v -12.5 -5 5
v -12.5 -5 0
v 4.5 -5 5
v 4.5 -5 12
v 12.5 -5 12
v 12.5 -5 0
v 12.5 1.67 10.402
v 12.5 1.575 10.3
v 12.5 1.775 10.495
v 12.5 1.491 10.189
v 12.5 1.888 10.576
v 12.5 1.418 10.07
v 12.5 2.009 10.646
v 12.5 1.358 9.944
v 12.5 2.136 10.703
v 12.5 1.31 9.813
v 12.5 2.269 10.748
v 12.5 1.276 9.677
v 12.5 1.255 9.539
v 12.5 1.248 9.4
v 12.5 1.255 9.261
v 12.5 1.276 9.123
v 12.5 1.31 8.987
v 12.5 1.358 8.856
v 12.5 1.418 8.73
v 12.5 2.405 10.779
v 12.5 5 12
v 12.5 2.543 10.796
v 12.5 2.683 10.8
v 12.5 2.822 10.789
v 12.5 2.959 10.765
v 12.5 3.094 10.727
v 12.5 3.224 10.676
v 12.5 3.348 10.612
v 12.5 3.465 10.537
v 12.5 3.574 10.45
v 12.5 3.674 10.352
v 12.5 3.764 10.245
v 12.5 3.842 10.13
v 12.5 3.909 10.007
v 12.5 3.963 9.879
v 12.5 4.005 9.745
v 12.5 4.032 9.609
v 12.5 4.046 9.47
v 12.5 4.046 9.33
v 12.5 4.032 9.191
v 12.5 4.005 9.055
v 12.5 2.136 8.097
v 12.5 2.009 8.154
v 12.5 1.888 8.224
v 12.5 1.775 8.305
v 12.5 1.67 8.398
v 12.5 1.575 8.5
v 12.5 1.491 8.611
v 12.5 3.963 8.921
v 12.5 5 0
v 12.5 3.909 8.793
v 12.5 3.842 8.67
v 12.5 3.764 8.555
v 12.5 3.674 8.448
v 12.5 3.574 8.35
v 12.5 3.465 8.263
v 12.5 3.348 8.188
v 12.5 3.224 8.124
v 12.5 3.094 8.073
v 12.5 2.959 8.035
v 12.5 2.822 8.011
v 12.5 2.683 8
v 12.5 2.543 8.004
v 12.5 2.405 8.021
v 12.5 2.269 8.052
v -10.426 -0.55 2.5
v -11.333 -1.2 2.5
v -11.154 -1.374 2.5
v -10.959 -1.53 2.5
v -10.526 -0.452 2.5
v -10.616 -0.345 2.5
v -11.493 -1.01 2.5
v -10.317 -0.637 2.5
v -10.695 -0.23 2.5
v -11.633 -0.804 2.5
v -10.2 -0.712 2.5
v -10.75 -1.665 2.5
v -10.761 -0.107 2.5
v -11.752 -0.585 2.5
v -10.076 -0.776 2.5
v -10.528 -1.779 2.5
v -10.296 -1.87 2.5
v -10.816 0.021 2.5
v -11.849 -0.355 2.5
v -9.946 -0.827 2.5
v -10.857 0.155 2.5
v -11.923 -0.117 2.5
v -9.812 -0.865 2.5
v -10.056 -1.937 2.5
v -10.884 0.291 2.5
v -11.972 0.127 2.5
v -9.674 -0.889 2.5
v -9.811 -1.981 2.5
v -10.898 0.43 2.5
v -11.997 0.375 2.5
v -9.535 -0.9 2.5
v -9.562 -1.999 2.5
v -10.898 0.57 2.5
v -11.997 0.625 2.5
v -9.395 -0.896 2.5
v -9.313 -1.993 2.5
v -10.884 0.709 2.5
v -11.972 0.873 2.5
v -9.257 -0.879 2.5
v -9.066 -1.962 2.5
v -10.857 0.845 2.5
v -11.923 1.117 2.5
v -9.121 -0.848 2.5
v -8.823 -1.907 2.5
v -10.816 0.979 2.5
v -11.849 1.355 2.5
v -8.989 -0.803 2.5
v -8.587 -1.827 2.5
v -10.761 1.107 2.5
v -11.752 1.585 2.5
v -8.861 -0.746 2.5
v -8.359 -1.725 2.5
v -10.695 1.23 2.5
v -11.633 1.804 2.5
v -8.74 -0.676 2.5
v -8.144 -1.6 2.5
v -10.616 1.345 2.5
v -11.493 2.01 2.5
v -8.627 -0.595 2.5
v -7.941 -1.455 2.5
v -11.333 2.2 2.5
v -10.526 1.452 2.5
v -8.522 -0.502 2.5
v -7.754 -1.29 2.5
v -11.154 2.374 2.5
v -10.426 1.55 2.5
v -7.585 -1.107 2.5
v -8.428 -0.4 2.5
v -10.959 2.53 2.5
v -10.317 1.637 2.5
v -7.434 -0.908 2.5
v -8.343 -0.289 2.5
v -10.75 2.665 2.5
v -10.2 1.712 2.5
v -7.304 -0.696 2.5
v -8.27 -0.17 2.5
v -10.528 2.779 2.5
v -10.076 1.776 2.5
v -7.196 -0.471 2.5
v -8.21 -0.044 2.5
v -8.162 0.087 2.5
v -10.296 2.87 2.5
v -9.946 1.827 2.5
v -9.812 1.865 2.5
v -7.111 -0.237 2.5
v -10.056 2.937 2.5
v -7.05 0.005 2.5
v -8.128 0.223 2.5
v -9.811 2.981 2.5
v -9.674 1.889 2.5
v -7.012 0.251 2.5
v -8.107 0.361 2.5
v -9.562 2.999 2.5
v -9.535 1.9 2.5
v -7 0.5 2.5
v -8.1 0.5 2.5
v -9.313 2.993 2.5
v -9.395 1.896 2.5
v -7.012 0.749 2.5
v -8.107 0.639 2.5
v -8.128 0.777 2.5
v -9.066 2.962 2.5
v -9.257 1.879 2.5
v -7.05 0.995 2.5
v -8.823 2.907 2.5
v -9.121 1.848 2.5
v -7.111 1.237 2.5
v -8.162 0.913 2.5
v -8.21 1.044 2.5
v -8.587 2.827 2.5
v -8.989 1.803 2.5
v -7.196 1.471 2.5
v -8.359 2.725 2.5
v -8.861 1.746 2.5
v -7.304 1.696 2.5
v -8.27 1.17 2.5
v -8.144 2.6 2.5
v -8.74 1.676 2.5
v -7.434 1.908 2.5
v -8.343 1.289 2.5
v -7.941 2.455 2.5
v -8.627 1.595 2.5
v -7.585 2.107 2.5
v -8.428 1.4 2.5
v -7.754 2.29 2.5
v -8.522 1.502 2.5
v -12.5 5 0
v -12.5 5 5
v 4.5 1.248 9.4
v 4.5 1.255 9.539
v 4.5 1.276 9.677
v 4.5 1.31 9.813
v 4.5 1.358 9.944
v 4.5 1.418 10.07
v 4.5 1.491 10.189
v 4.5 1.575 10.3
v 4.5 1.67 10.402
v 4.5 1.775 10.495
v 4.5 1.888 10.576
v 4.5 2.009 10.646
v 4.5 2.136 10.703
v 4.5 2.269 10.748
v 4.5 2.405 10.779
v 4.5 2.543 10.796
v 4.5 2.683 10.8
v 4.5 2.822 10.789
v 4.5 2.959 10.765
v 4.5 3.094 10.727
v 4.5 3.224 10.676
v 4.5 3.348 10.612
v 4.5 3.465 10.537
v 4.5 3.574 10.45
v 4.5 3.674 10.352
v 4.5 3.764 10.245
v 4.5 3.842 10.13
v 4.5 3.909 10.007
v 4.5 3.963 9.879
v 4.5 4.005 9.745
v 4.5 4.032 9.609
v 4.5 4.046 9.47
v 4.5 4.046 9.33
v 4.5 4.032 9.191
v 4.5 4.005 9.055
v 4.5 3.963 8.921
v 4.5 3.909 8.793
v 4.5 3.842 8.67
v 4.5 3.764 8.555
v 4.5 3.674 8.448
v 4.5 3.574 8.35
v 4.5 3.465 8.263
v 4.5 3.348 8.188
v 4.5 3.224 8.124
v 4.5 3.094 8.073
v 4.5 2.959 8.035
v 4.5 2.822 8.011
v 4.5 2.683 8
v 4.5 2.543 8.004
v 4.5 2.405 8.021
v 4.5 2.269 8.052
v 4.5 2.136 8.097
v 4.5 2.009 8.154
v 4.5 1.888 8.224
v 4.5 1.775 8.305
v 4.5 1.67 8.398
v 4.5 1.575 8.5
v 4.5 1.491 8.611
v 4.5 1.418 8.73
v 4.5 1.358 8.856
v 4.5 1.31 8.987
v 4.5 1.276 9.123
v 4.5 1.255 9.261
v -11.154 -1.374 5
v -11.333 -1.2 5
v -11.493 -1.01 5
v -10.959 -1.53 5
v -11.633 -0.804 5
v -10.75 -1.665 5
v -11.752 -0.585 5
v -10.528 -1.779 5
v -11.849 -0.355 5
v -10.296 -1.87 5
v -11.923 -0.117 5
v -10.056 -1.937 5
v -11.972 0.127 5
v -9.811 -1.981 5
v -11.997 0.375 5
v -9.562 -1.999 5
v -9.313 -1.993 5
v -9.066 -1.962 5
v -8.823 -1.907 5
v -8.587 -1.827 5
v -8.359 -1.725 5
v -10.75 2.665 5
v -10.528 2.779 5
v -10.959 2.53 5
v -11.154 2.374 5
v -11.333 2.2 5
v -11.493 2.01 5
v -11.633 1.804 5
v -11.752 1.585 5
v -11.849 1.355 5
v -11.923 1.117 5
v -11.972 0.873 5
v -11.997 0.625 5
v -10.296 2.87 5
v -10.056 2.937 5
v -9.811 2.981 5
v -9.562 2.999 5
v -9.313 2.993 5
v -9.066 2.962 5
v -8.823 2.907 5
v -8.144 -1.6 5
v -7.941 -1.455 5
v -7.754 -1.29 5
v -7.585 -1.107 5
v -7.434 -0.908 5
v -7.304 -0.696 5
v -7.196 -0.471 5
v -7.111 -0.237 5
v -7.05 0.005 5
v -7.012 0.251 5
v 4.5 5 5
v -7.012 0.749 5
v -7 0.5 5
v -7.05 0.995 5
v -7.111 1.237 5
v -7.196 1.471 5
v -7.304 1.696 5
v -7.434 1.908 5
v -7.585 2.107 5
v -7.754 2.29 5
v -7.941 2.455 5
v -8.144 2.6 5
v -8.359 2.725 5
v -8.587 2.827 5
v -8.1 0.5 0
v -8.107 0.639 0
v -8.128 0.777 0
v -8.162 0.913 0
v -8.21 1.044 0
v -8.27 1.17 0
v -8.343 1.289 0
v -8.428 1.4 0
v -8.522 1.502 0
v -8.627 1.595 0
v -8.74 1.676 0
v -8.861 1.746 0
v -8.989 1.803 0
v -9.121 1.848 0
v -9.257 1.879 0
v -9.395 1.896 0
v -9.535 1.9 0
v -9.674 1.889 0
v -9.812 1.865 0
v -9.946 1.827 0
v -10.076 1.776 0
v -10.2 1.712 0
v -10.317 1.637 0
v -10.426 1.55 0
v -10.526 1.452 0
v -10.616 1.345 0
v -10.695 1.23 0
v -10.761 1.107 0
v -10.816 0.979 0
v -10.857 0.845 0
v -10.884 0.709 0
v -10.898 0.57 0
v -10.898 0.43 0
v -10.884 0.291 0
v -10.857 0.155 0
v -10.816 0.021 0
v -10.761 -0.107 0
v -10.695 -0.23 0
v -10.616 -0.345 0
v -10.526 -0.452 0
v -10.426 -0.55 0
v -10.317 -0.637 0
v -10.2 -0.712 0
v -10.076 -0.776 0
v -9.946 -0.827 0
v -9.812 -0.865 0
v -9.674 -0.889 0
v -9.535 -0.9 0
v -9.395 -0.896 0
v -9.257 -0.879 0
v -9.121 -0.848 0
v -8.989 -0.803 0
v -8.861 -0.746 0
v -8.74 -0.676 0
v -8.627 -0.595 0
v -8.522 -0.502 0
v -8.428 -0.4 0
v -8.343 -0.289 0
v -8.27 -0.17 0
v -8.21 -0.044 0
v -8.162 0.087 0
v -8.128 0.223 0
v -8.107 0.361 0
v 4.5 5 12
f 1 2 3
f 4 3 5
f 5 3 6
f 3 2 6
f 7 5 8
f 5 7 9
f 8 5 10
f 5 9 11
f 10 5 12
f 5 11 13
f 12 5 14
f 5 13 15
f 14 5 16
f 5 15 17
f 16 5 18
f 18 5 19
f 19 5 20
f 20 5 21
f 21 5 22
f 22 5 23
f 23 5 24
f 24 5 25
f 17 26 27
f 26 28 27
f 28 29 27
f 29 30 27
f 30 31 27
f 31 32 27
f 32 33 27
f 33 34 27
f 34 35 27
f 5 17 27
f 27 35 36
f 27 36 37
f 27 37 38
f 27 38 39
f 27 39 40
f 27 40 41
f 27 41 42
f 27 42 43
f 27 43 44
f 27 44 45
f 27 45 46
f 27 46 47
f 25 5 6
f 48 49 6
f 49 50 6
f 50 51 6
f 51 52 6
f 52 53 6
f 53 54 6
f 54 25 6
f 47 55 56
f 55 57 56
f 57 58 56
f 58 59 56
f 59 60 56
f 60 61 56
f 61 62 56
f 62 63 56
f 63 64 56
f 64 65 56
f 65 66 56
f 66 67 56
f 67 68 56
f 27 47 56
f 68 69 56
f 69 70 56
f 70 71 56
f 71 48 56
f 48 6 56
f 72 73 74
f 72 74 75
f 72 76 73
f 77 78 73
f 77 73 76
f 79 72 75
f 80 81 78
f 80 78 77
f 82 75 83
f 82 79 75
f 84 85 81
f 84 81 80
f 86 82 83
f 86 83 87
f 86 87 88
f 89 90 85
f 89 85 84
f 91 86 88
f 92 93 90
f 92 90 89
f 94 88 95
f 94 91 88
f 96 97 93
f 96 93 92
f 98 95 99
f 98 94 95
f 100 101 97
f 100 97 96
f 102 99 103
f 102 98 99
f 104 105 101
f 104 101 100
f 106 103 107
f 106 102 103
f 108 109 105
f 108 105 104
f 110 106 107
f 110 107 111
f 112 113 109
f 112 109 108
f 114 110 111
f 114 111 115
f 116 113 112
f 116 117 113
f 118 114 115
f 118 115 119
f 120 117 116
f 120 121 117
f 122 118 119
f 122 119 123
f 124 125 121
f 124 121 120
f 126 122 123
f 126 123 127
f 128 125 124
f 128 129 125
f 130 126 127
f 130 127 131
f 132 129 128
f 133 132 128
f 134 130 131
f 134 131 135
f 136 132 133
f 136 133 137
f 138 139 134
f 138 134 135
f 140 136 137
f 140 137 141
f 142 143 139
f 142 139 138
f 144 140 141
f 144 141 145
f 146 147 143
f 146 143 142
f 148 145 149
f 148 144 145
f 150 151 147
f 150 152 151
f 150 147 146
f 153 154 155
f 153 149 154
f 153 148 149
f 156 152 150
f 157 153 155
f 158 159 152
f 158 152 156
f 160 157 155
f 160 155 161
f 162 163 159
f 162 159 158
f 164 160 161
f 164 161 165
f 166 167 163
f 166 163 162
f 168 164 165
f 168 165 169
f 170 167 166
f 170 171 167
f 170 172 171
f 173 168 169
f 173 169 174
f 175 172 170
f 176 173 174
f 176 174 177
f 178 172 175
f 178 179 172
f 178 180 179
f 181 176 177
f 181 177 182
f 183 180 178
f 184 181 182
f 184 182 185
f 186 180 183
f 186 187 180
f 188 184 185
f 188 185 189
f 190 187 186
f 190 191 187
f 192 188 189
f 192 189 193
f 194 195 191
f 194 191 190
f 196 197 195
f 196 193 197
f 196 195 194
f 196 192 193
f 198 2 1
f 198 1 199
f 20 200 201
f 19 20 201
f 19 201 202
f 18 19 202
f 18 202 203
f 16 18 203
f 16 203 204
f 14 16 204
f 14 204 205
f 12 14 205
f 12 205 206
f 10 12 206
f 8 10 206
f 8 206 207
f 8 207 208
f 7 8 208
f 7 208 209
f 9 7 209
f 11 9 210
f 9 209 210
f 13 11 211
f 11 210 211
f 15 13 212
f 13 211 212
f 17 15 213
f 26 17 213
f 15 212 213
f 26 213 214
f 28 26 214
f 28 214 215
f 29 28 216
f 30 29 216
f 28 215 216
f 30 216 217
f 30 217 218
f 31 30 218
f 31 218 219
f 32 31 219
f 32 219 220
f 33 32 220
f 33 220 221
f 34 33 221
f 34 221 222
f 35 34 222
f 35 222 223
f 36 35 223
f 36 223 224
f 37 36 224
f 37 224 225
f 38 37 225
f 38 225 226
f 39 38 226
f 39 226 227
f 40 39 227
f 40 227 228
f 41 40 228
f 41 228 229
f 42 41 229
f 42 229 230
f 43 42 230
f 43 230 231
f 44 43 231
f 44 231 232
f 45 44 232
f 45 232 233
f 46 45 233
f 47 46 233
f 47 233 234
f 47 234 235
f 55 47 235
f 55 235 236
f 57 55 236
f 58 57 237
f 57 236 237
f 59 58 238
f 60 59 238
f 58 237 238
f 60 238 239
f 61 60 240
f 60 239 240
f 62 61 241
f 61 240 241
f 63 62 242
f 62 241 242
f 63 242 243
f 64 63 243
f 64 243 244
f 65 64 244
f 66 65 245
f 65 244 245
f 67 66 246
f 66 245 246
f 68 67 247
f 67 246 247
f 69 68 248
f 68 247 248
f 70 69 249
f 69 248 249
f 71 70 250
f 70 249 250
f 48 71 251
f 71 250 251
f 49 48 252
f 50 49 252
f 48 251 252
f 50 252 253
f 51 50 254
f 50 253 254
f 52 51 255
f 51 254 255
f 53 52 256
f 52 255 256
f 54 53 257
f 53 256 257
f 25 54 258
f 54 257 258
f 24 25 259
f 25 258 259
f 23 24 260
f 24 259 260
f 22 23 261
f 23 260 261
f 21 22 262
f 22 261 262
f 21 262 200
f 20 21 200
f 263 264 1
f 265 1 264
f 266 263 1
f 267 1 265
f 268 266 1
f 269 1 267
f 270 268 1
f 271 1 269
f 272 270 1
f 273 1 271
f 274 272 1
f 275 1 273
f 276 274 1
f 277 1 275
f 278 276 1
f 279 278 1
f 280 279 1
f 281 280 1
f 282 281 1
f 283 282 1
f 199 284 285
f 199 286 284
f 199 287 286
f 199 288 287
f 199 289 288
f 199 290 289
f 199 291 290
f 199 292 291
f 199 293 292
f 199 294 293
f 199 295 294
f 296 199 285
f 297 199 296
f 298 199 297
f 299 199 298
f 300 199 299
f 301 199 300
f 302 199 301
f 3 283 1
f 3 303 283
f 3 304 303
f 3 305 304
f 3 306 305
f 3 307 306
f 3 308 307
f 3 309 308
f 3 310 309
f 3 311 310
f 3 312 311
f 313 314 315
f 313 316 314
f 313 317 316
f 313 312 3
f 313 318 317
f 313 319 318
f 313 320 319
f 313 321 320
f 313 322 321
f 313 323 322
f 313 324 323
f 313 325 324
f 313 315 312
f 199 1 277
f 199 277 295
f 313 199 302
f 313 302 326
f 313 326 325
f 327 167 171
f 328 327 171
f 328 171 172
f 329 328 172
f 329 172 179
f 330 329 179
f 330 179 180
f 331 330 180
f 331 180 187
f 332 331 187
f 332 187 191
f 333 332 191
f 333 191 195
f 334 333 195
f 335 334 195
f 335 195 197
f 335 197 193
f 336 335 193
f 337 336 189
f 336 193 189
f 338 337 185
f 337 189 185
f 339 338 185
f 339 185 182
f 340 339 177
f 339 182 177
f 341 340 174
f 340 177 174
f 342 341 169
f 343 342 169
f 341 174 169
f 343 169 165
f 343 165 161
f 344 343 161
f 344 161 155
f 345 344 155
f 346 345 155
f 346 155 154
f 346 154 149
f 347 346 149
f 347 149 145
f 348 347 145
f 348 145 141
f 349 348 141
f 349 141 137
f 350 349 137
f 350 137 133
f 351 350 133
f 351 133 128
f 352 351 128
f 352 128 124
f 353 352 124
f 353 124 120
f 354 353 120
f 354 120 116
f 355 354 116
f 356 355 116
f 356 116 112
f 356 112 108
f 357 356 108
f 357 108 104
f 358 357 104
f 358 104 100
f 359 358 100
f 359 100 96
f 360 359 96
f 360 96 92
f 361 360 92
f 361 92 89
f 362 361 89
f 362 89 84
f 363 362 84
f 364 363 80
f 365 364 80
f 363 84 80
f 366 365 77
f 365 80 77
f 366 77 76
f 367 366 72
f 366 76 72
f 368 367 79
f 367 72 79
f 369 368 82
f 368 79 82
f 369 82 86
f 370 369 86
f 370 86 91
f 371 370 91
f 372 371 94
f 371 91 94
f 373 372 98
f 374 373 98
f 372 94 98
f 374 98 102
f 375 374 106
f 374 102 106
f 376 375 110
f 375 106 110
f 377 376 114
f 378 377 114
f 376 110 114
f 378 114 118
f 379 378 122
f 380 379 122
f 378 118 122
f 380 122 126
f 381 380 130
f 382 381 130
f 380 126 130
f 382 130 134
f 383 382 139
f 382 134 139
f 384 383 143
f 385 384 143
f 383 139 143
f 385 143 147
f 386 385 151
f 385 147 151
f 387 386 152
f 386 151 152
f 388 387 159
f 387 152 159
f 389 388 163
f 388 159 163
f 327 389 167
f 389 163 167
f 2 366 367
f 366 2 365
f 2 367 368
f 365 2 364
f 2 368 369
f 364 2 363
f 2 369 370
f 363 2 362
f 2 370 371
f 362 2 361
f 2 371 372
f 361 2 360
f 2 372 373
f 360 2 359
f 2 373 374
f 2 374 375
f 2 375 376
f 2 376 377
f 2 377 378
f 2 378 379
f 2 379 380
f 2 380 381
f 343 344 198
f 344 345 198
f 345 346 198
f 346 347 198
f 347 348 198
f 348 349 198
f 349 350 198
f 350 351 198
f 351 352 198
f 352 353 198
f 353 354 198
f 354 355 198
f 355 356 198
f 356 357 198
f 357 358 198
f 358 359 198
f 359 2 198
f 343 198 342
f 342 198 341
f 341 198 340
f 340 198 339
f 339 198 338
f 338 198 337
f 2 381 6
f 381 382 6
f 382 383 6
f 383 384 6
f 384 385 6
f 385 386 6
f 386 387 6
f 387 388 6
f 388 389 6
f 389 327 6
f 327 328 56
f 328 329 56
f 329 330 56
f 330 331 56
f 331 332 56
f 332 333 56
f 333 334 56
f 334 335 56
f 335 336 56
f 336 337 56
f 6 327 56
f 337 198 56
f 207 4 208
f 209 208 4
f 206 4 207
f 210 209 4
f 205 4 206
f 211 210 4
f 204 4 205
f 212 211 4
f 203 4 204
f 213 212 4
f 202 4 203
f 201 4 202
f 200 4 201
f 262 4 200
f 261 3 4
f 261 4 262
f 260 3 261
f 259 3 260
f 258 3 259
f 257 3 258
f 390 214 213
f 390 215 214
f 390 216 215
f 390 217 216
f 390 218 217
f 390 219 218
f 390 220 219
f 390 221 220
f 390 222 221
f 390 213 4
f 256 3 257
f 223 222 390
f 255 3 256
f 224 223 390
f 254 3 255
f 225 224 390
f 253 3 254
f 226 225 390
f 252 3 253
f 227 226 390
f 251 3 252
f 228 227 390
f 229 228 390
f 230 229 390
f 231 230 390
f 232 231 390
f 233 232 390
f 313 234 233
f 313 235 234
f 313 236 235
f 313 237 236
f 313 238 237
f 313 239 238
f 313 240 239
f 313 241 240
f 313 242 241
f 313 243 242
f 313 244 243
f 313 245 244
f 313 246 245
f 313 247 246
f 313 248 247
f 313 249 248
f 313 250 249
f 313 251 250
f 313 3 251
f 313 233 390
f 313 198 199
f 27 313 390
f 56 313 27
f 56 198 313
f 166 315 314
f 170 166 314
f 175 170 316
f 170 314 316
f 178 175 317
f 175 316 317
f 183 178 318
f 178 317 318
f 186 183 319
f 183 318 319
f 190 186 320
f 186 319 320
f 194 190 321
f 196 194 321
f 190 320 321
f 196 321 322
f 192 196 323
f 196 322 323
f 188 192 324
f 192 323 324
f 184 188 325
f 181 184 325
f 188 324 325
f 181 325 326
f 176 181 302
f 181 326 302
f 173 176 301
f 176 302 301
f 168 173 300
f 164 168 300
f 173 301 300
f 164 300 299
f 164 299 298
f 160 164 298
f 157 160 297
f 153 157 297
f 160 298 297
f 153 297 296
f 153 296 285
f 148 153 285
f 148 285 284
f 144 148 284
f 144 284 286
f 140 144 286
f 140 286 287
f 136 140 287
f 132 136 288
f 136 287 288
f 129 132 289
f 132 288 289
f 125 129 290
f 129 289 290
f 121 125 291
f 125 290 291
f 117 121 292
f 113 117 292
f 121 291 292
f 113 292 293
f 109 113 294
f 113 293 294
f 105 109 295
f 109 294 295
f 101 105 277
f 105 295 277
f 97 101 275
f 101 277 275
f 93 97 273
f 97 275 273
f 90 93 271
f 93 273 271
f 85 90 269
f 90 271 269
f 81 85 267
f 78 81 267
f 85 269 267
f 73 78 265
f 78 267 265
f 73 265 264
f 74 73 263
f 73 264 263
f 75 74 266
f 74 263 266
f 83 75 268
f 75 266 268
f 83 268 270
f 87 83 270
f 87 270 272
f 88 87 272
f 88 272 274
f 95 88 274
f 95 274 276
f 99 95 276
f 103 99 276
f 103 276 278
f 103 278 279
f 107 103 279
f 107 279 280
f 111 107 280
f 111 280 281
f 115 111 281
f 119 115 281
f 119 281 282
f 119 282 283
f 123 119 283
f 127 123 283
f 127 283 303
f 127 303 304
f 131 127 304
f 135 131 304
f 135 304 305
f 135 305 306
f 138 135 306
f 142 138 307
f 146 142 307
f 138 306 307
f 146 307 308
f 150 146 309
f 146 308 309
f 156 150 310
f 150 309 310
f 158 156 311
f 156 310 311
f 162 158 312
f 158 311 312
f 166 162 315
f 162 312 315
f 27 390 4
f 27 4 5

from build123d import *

# Parameters (mm, degrees)
F0_W     = 25
F0_H     = 10
F1_DEPTH = 5
F2_R     = 1.4
F3_DEPTH = 25
F2_W     = 8
F2_H     = 10
F4_DEPTH = 7
F5_R     = 1.4
F6_DEPTH = 25
F2_R_2   = 2.5
F7_DEPTH = 2.5


with BuildPart() as f1:
    # F0 (on Top) → F1 (new body)
    with BuildSketch(Plane.XY):
        Rectangle(F0_W, F0_H)
    extrude(amount=F1_DEPTH)

    # F2 (on face) → F3 (cut)
    with BuildSketch(Plane.XY.offset(5)):
        with Locations((-9.5, 0.5)):
            Circle(F2_R)
    extrude(amount=-F3_DEPTH, mode=Mode.SUBTRACT)

    # F2 (on face) → F4 (join)
    with BuildSketch(Plane.XY.offset(5)):
        with Locations((8.5, 0)):
            Rectangle(F2_W, F2_H)
    extrude(amount=F4_DEPTH)

    # F5 (on face) → F6 (cut)
    with BuildSketch(Plane(origin=(4.5, 0, 0), x_dir=(0, -1, 0), z_dir=(-1, 0, 0))):
        with Locations((-2.647824, 9.4)):
            Circle(F5_R)
    extrude(amount=-F6_DEPTH, mode=Mode.SUBTRACT)

    # F2 (on face) → F7 (cut)
    with BuildSketch(Plane.XY.offset(5)):
        with Locations((-9.5, 0.5)):
            Circle(F2_R_2)
        with Locations((-9.5, 0.5)):
            Circle(F2_R, mode=Mode.SUBTRACT)
    extrude(amount=-F7_DEPTH, mode=Mode.SUBTRACT)


solid = f1.part
